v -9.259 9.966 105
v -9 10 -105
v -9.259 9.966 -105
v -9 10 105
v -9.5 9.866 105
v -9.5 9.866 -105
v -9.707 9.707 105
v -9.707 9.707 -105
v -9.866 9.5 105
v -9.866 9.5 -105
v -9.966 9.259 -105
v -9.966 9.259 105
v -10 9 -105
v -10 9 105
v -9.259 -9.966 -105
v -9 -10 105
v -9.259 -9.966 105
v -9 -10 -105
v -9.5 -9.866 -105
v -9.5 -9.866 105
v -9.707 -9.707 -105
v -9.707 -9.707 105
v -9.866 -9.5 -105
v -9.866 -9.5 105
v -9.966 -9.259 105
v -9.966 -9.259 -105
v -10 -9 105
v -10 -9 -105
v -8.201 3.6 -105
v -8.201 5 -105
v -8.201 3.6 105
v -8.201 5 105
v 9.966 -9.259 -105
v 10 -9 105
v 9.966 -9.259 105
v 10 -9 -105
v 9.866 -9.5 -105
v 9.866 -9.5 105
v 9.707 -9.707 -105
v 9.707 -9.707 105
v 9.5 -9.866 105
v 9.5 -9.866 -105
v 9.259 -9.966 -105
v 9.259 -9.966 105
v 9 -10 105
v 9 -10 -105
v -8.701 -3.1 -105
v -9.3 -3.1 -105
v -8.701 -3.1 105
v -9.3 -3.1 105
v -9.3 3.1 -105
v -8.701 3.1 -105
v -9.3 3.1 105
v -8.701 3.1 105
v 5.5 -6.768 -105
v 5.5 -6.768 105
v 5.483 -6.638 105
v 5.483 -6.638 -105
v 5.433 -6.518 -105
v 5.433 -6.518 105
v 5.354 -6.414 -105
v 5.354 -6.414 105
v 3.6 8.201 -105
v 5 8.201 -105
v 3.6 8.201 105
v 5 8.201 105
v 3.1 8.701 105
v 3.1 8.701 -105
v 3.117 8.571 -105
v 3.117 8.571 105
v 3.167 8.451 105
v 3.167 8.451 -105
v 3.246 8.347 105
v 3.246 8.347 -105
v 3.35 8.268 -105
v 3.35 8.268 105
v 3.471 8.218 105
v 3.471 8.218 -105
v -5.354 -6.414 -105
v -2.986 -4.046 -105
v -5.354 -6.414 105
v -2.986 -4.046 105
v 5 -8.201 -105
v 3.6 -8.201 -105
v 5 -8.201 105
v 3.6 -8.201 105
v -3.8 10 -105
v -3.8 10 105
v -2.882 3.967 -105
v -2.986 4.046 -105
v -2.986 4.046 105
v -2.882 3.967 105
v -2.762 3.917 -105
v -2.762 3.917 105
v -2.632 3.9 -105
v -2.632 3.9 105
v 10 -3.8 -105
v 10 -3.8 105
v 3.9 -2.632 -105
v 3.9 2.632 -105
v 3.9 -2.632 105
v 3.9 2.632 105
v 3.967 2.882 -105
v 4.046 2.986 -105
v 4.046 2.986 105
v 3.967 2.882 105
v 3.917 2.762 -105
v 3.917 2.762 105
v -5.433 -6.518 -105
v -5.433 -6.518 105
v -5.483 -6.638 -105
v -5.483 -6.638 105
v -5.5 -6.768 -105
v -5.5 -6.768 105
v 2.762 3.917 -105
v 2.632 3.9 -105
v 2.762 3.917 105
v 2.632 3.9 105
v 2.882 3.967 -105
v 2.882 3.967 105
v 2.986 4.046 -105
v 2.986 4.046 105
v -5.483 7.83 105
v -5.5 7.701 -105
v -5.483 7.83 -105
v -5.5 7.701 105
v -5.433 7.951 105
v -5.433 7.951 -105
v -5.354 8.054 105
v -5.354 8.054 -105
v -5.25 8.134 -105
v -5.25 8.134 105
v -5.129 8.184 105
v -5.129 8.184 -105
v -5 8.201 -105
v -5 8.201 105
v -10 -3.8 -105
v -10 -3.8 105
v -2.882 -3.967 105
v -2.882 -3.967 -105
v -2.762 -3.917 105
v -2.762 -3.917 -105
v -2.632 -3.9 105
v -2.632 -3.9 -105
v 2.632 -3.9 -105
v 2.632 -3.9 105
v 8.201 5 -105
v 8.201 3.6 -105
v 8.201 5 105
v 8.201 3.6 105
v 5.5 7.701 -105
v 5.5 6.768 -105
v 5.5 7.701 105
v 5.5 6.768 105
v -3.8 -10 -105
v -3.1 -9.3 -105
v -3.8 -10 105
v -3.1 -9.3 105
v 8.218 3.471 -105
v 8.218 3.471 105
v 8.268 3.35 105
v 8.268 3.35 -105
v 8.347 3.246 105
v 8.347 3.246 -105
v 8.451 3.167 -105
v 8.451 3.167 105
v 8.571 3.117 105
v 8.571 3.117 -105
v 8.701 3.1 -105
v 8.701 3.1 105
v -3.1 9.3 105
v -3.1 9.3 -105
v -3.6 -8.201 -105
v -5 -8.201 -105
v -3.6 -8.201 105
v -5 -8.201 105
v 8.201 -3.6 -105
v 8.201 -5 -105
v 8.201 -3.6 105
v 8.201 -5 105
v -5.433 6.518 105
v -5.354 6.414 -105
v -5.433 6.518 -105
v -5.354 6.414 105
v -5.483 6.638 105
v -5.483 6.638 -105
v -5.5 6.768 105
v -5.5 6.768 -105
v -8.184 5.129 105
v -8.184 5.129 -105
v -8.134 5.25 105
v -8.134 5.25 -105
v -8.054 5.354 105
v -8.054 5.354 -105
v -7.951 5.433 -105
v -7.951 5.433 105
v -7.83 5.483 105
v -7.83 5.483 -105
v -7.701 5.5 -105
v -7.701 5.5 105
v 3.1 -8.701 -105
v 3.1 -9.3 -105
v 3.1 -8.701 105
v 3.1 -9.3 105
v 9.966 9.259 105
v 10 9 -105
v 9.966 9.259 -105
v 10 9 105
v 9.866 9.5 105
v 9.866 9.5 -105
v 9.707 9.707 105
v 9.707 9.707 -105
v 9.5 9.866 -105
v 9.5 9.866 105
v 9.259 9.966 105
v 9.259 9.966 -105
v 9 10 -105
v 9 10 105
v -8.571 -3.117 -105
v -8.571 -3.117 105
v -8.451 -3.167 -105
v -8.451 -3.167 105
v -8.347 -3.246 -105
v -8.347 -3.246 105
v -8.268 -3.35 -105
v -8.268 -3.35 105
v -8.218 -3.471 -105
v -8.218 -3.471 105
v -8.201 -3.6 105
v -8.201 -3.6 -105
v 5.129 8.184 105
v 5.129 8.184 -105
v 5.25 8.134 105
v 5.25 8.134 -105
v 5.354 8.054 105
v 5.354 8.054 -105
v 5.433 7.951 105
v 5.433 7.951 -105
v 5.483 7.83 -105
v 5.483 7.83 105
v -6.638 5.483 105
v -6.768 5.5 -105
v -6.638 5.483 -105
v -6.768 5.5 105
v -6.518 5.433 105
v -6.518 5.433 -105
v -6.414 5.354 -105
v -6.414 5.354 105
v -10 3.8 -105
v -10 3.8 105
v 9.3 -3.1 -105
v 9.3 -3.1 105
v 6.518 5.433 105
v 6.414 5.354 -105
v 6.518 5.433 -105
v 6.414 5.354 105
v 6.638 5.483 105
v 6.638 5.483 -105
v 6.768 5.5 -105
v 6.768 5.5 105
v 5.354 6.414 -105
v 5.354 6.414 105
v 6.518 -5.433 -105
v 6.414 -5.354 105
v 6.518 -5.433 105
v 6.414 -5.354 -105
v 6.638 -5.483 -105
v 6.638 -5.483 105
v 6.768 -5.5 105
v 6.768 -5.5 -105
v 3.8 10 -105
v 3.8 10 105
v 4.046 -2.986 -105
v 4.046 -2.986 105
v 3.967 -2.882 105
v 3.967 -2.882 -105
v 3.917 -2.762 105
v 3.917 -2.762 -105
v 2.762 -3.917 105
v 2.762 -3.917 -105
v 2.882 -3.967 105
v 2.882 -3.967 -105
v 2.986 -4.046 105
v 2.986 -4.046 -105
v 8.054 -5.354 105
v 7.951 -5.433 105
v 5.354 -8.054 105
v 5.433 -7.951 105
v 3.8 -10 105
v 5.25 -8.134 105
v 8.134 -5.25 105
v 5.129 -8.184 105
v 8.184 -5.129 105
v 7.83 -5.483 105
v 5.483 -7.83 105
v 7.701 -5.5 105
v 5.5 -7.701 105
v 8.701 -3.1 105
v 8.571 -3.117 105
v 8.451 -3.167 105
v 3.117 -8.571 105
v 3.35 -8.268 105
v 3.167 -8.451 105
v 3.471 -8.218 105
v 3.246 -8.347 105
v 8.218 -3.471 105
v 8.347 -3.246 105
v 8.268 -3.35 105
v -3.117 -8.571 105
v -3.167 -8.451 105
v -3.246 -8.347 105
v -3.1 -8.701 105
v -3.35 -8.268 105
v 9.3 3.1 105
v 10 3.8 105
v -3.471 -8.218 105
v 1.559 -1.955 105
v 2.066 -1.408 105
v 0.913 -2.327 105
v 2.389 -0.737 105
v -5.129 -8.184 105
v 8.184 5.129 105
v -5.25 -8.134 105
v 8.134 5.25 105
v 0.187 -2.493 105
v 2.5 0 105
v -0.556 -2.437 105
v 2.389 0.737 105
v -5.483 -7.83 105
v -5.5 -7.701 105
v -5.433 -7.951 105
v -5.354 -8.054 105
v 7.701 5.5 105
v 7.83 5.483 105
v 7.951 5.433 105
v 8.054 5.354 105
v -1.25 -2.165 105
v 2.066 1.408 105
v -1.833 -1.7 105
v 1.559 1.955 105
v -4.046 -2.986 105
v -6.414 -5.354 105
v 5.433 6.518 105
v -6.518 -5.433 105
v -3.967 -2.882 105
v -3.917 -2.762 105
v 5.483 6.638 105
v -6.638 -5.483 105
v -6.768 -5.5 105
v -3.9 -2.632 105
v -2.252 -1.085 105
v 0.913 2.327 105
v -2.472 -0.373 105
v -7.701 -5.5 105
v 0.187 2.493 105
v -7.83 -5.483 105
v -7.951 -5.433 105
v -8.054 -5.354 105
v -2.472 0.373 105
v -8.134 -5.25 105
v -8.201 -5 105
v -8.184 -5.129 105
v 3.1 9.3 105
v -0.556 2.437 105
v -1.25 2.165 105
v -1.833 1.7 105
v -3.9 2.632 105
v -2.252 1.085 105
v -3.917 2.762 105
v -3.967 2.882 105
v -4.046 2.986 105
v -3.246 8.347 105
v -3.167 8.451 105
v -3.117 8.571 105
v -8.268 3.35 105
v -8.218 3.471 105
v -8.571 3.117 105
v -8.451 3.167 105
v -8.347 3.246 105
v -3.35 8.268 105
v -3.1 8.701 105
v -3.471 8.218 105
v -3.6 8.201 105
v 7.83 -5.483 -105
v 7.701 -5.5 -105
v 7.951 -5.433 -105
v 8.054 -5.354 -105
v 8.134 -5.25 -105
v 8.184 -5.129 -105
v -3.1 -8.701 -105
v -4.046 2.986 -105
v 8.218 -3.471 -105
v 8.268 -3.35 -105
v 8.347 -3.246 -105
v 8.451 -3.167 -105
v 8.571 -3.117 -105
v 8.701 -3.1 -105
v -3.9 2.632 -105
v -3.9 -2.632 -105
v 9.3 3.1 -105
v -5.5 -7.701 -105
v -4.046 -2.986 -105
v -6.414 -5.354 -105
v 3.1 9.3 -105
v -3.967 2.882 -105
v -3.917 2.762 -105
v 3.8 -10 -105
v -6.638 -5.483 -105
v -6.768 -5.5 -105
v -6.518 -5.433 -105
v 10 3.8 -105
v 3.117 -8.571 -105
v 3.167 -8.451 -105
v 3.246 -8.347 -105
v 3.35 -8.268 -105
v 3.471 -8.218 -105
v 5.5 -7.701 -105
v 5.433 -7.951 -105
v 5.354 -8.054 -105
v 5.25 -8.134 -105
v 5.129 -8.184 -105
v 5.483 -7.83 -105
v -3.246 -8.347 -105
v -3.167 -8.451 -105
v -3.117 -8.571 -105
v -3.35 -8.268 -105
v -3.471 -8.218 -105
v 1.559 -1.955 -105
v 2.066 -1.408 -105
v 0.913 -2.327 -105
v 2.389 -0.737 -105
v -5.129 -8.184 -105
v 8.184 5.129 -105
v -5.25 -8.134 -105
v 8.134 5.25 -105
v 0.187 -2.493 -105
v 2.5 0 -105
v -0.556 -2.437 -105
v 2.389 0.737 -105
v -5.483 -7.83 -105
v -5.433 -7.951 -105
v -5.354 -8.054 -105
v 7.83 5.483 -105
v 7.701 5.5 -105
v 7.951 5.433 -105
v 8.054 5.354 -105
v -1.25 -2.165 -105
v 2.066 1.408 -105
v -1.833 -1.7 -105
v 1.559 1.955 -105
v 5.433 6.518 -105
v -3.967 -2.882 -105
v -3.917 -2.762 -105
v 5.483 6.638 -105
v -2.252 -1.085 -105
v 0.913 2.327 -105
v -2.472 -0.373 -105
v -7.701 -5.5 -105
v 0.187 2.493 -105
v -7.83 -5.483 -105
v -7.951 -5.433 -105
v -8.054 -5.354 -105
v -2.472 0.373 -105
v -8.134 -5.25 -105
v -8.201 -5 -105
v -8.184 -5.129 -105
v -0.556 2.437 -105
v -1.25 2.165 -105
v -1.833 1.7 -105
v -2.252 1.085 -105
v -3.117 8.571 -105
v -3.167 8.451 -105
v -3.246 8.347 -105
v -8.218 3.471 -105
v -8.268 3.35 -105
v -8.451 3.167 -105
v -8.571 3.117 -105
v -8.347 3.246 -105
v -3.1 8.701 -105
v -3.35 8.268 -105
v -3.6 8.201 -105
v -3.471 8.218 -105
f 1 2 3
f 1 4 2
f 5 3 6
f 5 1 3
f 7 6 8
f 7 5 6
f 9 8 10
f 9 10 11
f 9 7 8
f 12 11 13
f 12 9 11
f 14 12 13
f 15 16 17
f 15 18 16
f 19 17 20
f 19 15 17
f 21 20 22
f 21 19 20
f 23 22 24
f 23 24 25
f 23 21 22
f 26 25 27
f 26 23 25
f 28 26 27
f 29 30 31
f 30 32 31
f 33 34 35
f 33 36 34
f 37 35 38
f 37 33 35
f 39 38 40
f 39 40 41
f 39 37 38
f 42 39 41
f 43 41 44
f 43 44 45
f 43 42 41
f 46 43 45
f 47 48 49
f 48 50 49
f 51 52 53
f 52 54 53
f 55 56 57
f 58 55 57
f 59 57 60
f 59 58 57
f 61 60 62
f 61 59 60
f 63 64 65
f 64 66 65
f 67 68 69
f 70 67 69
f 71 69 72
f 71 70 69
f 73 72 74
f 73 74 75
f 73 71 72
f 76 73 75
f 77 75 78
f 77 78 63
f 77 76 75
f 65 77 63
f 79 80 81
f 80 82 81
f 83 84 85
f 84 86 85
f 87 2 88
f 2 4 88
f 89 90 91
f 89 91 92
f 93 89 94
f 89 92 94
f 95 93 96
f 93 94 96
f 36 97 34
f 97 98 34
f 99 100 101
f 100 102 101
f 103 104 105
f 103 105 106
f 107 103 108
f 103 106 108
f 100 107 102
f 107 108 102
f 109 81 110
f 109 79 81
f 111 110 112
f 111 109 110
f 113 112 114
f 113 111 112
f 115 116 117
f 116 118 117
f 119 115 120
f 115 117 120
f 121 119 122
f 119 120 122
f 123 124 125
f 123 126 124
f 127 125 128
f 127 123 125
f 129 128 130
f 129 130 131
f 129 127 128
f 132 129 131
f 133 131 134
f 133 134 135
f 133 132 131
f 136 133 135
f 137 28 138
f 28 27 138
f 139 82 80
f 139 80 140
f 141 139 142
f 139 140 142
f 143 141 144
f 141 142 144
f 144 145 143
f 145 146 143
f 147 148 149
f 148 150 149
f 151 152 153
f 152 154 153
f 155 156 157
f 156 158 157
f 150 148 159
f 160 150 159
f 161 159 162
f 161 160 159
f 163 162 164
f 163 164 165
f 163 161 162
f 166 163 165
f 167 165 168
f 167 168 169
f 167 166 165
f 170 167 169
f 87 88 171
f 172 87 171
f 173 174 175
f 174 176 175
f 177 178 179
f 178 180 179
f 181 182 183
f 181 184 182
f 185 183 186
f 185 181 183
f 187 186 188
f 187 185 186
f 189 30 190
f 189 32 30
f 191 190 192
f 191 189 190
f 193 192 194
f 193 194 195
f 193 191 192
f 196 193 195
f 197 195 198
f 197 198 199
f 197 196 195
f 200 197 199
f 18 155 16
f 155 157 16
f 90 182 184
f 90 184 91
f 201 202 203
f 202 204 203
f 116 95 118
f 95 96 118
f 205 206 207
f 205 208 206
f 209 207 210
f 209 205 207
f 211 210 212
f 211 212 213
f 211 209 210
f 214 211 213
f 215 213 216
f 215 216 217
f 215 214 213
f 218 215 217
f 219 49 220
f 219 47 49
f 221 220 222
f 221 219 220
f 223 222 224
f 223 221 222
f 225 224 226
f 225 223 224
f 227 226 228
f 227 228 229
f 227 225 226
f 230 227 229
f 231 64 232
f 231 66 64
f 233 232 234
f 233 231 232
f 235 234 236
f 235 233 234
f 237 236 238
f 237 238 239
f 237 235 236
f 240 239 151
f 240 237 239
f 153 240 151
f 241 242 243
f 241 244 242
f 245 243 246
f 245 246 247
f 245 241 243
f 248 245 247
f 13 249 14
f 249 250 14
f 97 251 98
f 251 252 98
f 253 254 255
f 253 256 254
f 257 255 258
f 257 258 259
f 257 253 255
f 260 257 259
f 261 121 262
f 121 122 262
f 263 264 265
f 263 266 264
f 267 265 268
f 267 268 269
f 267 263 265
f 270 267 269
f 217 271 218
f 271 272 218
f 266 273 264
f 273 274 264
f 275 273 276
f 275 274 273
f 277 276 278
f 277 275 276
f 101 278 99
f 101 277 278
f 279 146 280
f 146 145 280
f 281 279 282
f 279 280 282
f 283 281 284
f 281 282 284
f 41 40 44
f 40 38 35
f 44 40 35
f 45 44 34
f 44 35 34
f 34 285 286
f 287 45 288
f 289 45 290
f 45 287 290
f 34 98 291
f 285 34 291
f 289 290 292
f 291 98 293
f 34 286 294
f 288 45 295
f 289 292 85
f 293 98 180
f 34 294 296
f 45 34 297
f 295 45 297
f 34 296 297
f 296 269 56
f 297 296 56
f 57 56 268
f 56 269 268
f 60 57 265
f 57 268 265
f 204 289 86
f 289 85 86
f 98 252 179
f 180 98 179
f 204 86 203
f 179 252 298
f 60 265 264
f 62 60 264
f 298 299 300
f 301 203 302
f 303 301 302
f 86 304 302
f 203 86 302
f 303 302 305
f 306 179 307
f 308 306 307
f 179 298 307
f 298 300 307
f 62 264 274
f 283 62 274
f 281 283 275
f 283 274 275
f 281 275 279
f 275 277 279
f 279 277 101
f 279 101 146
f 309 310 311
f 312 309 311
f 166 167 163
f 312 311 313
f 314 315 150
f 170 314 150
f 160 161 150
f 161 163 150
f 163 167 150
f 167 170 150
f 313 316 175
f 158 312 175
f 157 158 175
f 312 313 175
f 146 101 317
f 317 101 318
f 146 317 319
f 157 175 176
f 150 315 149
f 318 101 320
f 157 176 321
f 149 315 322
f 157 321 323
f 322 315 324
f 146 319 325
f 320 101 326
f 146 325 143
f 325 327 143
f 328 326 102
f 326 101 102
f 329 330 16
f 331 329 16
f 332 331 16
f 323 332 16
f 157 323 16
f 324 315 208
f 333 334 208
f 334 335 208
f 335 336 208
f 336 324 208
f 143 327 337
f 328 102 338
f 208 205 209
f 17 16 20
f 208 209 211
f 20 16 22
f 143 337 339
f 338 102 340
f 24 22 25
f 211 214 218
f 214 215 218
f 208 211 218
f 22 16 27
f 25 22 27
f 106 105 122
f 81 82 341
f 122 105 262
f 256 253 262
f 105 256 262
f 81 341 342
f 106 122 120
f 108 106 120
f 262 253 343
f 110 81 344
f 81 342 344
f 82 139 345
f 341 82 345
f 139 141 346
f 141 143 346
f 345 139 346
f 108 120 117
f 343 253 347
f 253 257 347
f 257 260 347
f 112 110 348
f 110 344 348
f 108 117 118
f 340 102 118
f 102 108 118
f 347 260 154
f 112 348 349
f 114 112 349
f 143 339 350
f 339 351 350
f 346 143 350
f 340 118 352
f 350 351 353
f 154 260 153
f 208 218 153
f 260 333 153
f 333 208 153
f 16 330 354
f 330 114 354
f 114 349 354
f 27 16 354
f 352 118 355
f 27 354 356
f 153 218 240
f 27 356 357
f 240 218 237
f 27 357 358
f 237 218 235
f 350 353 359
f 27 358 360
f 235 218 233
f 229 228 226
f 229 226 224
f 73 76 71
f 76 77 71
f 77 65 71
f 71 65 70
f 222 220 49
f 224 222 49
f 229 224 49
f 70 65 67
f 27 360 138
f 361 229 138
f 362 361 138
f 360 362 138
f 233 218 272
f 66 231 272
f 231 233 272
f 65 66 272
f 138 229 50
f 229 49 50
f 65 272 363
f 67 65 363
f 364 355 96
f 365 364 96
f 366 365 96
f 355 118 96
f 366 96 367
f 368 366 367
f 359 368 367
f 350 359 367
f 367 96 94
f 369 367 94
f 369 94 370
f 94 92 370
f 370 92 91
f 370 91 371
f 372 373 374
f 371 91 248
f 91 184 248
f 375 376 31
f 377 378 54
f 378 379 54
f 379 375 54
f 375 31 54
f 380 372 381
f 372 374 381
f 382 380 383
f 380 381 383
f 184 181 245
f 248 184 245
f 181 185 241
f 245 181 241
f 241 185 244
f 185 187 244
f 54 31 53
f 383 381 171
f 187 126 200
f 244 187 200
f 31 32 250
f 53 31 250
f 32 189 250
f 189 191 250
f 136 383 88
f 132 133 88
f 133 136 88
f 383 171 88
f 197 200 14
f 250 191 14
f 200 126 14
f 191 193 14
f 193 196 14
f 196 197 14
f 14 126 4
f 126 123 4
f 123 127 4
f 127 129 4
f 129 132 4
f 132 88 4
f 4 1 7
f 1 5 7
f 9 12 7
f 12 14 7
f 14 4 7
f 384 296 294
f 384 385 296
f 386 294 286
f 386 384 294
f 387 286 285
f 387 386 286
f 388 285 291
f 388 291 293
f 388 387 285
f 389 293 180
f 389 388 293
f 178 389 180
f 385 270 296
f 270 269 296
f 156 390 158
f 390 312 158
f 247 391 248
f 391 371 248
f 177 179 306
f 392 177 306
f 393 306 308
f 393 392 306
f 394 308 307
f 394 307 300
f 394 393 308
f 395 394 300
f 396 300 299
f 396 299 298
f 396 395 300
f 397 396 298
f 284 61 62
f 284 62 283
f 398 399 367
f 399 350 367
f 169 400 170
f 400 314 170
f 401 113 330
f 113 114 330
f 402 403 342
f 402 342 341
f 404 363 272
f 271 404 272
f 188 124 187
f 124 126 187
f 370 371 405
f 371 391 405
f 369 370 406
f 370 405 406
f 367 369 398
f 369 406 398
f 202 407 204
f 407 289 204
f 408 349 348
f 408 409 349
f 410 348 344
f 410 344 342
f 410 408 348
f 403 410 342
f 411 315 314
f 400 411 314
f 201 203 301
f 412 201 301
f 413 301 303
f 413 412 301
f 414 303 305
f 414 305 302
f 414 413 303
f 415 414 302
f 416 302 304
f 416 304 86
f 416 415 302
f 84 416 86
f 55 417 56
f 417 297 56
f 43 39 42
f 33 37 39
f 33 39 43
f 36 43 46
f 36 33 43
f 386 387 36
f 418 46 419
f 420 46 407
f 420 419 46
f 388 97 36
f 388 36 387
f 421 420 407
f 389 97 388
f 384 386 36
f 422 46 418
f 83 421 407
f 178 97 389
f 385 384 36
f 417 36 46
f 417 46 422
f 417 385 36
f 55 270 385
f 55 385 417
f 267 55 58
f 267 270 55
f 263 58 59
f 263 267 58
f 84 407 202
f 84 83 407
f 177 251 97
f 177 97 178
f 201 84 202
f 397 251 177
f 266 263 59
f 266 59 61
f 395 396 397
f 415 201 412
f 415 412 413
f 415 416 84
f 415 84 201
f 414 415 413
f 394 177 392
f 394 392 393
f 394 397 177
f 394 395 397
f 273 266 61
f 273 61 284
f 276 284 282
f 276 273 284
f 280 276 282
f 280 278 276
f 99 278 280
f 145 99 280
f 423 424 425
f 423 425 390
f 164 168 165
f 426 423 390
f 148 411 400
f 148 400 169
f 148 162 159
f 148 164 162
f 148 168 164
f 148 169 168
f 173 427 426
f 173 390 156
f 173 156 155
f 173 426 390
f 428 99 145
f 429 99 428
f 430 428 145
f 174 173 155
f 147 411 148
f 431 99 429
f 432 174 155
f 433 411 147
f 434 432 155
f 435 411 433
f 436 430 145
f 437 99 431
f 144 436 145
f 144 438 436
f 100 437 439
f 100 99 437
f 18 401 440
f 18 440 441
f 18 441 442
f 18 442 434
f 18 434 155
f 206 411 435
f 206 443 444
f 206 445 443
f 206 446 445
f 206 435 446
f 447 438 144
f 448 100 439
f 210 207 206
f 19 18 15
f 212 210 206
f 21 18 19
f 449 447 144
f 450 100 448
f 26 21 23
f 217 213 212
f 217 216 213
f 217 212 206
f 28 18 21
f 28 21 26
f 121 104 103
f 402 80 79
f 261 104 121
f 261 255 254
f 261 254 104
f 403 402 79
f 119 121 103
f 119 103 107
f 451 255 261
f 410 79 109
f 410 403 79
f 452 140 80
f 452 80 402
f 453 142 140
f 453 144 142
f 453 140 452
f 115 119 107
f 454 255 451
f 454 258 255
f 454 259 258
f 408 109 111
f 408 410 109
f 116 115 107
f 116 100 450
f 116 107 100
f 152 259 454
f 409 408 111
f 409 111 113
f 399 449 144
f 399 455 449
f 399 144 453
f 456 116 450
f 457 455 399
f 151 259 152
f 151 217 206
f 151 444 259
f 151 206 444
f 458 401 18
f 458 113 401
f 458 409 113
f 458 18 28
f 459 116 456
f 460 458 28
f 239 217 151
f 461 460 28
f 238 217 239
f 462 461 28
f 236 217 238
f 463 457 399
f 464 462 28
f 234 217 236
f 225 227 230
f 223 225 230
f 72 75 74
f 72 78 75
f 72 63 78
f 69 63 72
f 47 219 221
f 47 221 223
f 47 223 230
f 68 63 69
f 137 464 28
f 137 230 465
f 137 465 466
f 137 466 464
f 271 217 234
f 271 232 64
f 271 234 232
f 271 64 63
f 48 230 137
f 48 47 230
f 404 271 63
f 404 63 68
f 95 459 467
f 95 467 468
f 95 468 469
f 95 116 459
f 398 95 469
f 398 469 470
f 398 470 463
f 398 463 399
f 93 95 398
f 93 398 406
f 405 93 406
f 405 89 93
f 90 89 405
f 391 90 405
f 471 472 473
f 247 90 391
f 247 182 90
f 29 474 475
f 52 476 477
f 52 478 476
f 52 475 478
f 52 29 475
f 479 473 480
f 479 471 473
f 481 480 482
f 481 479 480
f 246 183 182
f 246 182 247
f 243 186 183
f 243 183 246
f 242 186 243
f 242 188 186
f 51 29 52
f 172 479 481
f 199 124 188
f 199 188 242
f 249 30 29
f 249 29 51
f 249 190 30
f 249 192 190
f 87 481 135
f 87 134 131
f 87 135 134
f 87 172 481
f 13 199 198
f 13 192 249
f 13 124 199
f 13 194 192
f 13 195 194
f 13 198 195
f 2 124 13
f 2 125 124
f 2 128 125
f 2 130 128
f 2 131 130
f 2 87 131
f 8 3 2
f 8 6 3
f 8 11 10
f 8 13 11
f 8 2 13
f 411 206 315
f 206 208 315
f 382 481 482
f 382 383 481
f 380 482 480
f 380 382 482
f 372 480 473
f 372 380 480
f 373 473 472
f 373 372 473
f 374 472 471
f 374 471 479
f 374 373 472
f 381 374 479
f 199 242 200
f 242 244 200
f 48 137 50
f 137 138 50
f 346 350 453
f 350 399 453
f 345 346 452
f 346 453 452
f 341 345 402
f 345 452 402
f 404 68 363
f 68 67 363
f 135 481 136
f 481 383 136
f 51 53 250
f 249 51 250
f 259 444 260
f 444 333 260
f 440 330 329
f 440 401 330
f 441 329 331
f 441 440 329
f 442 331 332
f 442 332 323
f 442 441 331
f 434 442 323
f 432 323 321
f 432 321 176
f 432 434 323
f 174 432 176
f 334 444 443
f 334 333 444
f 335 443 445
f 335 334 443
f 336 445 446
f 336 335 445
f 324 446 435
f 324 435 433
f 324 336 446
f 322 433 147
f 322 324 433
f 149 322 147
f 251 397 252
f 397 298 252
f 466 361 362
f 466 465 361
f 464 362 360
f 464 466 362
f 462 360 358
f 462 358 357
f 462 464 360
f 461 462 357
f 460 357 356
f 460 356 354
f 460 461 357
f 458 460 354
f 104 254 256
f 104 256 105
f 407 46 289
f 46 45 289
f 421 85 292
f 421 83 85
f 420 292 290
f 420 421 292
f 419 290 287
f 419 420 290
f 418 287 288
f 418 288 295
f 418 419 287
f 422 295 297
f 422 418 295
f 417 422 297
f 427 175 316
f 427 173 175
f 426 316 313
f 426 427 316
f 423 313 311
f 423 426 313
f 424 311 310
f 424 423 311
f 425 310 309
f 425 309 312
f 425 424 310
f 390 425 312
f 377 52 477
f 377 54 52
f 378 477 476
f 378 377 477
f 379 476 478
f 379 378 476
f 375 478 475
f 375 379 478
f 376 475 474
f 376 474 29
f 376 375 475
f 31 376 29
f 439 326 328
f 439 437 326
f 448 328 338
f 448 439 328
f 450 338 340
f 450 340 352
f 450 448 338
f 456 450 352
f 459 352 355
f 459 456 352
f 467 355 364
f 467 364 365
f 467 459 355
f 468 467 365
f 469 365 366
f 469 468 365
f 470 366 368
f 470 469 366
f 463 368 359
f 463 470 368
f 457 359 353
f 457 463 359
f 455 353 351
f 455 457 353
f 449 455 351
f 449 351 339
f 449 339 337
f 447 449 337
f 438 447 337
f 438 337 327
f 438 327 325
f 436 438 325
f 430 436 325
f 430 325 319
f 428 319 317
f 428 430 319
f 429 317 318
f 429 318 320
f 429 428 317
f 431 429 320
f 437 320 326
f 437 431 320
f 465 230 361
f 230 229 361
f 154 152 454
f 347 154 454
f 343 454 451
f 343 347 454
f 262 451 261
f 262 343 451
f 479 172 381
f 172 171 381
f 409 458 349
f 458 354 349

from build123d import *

# Parameters (mm, degrees)
SKETCH1_R           = 2.5
BOSS_EXTRUDE1_DEPTH = 105
FILLET1_R           = 0.5
FILLET2_R           = 0.5
FILLET3_R           = 1


with BuildPart() as part:
    # Sketch1 → Boss-Extrude1 (new, symmetric)
    with BuildSketch(Plane.XY):
        Polygon((3.9, -2.839339828), (6.560660172, -5.5), (8.200660172, -5.5), (8.200660172, -3.1), (9.3, -3.1), (10, -3.8), (10, -10), (3.8, -10), (3.1, -9.3), (3.1, -8.200660172), (5.5, -8.200660172), (5.5, -6.560660172), (2.839339828, -3.9), (-2.839339828, -3.9), (-5.5, -6.560660172), (-5.5, -8.200660172), (-3.1, -8.200660172), (-3.1, -9.3), (-3.8, -10), (-10, -10), (-10, -3.8), (-9.3, -3.1), (-8.200660172, -3.1), (-8.200660172, -5.5), (-6.560660172, -5.5), (-3.9, -2.839339828), (-3.9, 2.839339828), (-6.560660172, 5.5), (-8.200660172, 5.5), (-8.200660172, 3.1), (-9.3, 3.1), (-10, 3.8), (-10, 10), (-3.8, 10), (-3.1, 9.3), (-3.1, 8.200660172), (-5.5, 8.200660172), (-5.5, 6.560660172), (-2.839339828, 3.9), (2.839339828, 3.9), (5.5, 6.560660172), (5.5, 8.200660172), (3.1, 8.200660172), (3.1, 9.3), (3.8, 10), (10, 10), (10, 3.8), (9.3, 3.1), (8.200660172, 3.1), (8.200660172, 5.5), (6.560660172, 5.5), (3.9, 2.839339828), align=None)
        Circle(SKETCH1_R, mode=Mode.SUBTRACT)
    extrude(amount=BOSS_EXTRUDE1_DEPTH, both=True)

    # Fillet1
    fillet1_edges = [part.edges().sort_by_distance(p)[0] for p in [
        (-2.839339828, 3.9, 0),
        (2.839339828, 3.9, 0),
        (3.9, 2.839339828, 0),
        (3.9, -2.839339828, 0),
        (2.839339828, -3.9, 0),
        (-2.839339828, -3.9, 0),
        (-3.9, -2.839339828, 0),
        (-3.9, 2.839339828, 0),
    ]]
    fillet(fillet1_edges, radius=FILLET1_R)

    # Fillet2
    fillet2_edges = [part.edges().sort_by_distance(p)[0] for p in [
        (-5.5, 6.560660172, 0),
        (5.5, 6.560660172, 0),
        (5.5, 8.200660172, 0),
        (3.1, 8.200660172, 0),
        (8.200660172, 3.1, 0),
        (8.200660172, 5.5, 0),
        (6.560660172, 5.5, 0),
        (6.560660172, -5.5, 0),
        (8.200660172, -5.5, 0),
        (8.200660172, -3.1, 0),
        (3.1, -8.200660172, 0),
        (5.5, -8.200660172, 0),
        (5.5, -6.560660172, 0),
        (-5.5, -6.560660172, 0),
        (-5.5, -8.200660172, 0),
        (-3.1, -8.200660172, 0),
        (-8.200660172, -3.1, 0),
        (-8.200660172, -5.5, 0),
        (-6.560660172, -5.5, 0),
        (-6.560660172, 5.5, 0),
        (-8.200660172, 5.5, 0),
        (-8.200660172, 3.1, 0),
        (-3.1, 8.200660172, 0),
        (-5.5, 8.200660172, 0),
    ]]
    fillet(fillet2_edges, radius=FILLET2_R)

    # Fillet3
    fillet3_edges = [part.edges().sort_by_distance(p)[0] for p in [
        (10, 10, 0),
        (10, -10, 0),
        (-10, -10, 0),
        (-10, 10, 0),
    ]]
    fillet(fillet3_edges, radius=FILLET3_R)


solid = part.part
